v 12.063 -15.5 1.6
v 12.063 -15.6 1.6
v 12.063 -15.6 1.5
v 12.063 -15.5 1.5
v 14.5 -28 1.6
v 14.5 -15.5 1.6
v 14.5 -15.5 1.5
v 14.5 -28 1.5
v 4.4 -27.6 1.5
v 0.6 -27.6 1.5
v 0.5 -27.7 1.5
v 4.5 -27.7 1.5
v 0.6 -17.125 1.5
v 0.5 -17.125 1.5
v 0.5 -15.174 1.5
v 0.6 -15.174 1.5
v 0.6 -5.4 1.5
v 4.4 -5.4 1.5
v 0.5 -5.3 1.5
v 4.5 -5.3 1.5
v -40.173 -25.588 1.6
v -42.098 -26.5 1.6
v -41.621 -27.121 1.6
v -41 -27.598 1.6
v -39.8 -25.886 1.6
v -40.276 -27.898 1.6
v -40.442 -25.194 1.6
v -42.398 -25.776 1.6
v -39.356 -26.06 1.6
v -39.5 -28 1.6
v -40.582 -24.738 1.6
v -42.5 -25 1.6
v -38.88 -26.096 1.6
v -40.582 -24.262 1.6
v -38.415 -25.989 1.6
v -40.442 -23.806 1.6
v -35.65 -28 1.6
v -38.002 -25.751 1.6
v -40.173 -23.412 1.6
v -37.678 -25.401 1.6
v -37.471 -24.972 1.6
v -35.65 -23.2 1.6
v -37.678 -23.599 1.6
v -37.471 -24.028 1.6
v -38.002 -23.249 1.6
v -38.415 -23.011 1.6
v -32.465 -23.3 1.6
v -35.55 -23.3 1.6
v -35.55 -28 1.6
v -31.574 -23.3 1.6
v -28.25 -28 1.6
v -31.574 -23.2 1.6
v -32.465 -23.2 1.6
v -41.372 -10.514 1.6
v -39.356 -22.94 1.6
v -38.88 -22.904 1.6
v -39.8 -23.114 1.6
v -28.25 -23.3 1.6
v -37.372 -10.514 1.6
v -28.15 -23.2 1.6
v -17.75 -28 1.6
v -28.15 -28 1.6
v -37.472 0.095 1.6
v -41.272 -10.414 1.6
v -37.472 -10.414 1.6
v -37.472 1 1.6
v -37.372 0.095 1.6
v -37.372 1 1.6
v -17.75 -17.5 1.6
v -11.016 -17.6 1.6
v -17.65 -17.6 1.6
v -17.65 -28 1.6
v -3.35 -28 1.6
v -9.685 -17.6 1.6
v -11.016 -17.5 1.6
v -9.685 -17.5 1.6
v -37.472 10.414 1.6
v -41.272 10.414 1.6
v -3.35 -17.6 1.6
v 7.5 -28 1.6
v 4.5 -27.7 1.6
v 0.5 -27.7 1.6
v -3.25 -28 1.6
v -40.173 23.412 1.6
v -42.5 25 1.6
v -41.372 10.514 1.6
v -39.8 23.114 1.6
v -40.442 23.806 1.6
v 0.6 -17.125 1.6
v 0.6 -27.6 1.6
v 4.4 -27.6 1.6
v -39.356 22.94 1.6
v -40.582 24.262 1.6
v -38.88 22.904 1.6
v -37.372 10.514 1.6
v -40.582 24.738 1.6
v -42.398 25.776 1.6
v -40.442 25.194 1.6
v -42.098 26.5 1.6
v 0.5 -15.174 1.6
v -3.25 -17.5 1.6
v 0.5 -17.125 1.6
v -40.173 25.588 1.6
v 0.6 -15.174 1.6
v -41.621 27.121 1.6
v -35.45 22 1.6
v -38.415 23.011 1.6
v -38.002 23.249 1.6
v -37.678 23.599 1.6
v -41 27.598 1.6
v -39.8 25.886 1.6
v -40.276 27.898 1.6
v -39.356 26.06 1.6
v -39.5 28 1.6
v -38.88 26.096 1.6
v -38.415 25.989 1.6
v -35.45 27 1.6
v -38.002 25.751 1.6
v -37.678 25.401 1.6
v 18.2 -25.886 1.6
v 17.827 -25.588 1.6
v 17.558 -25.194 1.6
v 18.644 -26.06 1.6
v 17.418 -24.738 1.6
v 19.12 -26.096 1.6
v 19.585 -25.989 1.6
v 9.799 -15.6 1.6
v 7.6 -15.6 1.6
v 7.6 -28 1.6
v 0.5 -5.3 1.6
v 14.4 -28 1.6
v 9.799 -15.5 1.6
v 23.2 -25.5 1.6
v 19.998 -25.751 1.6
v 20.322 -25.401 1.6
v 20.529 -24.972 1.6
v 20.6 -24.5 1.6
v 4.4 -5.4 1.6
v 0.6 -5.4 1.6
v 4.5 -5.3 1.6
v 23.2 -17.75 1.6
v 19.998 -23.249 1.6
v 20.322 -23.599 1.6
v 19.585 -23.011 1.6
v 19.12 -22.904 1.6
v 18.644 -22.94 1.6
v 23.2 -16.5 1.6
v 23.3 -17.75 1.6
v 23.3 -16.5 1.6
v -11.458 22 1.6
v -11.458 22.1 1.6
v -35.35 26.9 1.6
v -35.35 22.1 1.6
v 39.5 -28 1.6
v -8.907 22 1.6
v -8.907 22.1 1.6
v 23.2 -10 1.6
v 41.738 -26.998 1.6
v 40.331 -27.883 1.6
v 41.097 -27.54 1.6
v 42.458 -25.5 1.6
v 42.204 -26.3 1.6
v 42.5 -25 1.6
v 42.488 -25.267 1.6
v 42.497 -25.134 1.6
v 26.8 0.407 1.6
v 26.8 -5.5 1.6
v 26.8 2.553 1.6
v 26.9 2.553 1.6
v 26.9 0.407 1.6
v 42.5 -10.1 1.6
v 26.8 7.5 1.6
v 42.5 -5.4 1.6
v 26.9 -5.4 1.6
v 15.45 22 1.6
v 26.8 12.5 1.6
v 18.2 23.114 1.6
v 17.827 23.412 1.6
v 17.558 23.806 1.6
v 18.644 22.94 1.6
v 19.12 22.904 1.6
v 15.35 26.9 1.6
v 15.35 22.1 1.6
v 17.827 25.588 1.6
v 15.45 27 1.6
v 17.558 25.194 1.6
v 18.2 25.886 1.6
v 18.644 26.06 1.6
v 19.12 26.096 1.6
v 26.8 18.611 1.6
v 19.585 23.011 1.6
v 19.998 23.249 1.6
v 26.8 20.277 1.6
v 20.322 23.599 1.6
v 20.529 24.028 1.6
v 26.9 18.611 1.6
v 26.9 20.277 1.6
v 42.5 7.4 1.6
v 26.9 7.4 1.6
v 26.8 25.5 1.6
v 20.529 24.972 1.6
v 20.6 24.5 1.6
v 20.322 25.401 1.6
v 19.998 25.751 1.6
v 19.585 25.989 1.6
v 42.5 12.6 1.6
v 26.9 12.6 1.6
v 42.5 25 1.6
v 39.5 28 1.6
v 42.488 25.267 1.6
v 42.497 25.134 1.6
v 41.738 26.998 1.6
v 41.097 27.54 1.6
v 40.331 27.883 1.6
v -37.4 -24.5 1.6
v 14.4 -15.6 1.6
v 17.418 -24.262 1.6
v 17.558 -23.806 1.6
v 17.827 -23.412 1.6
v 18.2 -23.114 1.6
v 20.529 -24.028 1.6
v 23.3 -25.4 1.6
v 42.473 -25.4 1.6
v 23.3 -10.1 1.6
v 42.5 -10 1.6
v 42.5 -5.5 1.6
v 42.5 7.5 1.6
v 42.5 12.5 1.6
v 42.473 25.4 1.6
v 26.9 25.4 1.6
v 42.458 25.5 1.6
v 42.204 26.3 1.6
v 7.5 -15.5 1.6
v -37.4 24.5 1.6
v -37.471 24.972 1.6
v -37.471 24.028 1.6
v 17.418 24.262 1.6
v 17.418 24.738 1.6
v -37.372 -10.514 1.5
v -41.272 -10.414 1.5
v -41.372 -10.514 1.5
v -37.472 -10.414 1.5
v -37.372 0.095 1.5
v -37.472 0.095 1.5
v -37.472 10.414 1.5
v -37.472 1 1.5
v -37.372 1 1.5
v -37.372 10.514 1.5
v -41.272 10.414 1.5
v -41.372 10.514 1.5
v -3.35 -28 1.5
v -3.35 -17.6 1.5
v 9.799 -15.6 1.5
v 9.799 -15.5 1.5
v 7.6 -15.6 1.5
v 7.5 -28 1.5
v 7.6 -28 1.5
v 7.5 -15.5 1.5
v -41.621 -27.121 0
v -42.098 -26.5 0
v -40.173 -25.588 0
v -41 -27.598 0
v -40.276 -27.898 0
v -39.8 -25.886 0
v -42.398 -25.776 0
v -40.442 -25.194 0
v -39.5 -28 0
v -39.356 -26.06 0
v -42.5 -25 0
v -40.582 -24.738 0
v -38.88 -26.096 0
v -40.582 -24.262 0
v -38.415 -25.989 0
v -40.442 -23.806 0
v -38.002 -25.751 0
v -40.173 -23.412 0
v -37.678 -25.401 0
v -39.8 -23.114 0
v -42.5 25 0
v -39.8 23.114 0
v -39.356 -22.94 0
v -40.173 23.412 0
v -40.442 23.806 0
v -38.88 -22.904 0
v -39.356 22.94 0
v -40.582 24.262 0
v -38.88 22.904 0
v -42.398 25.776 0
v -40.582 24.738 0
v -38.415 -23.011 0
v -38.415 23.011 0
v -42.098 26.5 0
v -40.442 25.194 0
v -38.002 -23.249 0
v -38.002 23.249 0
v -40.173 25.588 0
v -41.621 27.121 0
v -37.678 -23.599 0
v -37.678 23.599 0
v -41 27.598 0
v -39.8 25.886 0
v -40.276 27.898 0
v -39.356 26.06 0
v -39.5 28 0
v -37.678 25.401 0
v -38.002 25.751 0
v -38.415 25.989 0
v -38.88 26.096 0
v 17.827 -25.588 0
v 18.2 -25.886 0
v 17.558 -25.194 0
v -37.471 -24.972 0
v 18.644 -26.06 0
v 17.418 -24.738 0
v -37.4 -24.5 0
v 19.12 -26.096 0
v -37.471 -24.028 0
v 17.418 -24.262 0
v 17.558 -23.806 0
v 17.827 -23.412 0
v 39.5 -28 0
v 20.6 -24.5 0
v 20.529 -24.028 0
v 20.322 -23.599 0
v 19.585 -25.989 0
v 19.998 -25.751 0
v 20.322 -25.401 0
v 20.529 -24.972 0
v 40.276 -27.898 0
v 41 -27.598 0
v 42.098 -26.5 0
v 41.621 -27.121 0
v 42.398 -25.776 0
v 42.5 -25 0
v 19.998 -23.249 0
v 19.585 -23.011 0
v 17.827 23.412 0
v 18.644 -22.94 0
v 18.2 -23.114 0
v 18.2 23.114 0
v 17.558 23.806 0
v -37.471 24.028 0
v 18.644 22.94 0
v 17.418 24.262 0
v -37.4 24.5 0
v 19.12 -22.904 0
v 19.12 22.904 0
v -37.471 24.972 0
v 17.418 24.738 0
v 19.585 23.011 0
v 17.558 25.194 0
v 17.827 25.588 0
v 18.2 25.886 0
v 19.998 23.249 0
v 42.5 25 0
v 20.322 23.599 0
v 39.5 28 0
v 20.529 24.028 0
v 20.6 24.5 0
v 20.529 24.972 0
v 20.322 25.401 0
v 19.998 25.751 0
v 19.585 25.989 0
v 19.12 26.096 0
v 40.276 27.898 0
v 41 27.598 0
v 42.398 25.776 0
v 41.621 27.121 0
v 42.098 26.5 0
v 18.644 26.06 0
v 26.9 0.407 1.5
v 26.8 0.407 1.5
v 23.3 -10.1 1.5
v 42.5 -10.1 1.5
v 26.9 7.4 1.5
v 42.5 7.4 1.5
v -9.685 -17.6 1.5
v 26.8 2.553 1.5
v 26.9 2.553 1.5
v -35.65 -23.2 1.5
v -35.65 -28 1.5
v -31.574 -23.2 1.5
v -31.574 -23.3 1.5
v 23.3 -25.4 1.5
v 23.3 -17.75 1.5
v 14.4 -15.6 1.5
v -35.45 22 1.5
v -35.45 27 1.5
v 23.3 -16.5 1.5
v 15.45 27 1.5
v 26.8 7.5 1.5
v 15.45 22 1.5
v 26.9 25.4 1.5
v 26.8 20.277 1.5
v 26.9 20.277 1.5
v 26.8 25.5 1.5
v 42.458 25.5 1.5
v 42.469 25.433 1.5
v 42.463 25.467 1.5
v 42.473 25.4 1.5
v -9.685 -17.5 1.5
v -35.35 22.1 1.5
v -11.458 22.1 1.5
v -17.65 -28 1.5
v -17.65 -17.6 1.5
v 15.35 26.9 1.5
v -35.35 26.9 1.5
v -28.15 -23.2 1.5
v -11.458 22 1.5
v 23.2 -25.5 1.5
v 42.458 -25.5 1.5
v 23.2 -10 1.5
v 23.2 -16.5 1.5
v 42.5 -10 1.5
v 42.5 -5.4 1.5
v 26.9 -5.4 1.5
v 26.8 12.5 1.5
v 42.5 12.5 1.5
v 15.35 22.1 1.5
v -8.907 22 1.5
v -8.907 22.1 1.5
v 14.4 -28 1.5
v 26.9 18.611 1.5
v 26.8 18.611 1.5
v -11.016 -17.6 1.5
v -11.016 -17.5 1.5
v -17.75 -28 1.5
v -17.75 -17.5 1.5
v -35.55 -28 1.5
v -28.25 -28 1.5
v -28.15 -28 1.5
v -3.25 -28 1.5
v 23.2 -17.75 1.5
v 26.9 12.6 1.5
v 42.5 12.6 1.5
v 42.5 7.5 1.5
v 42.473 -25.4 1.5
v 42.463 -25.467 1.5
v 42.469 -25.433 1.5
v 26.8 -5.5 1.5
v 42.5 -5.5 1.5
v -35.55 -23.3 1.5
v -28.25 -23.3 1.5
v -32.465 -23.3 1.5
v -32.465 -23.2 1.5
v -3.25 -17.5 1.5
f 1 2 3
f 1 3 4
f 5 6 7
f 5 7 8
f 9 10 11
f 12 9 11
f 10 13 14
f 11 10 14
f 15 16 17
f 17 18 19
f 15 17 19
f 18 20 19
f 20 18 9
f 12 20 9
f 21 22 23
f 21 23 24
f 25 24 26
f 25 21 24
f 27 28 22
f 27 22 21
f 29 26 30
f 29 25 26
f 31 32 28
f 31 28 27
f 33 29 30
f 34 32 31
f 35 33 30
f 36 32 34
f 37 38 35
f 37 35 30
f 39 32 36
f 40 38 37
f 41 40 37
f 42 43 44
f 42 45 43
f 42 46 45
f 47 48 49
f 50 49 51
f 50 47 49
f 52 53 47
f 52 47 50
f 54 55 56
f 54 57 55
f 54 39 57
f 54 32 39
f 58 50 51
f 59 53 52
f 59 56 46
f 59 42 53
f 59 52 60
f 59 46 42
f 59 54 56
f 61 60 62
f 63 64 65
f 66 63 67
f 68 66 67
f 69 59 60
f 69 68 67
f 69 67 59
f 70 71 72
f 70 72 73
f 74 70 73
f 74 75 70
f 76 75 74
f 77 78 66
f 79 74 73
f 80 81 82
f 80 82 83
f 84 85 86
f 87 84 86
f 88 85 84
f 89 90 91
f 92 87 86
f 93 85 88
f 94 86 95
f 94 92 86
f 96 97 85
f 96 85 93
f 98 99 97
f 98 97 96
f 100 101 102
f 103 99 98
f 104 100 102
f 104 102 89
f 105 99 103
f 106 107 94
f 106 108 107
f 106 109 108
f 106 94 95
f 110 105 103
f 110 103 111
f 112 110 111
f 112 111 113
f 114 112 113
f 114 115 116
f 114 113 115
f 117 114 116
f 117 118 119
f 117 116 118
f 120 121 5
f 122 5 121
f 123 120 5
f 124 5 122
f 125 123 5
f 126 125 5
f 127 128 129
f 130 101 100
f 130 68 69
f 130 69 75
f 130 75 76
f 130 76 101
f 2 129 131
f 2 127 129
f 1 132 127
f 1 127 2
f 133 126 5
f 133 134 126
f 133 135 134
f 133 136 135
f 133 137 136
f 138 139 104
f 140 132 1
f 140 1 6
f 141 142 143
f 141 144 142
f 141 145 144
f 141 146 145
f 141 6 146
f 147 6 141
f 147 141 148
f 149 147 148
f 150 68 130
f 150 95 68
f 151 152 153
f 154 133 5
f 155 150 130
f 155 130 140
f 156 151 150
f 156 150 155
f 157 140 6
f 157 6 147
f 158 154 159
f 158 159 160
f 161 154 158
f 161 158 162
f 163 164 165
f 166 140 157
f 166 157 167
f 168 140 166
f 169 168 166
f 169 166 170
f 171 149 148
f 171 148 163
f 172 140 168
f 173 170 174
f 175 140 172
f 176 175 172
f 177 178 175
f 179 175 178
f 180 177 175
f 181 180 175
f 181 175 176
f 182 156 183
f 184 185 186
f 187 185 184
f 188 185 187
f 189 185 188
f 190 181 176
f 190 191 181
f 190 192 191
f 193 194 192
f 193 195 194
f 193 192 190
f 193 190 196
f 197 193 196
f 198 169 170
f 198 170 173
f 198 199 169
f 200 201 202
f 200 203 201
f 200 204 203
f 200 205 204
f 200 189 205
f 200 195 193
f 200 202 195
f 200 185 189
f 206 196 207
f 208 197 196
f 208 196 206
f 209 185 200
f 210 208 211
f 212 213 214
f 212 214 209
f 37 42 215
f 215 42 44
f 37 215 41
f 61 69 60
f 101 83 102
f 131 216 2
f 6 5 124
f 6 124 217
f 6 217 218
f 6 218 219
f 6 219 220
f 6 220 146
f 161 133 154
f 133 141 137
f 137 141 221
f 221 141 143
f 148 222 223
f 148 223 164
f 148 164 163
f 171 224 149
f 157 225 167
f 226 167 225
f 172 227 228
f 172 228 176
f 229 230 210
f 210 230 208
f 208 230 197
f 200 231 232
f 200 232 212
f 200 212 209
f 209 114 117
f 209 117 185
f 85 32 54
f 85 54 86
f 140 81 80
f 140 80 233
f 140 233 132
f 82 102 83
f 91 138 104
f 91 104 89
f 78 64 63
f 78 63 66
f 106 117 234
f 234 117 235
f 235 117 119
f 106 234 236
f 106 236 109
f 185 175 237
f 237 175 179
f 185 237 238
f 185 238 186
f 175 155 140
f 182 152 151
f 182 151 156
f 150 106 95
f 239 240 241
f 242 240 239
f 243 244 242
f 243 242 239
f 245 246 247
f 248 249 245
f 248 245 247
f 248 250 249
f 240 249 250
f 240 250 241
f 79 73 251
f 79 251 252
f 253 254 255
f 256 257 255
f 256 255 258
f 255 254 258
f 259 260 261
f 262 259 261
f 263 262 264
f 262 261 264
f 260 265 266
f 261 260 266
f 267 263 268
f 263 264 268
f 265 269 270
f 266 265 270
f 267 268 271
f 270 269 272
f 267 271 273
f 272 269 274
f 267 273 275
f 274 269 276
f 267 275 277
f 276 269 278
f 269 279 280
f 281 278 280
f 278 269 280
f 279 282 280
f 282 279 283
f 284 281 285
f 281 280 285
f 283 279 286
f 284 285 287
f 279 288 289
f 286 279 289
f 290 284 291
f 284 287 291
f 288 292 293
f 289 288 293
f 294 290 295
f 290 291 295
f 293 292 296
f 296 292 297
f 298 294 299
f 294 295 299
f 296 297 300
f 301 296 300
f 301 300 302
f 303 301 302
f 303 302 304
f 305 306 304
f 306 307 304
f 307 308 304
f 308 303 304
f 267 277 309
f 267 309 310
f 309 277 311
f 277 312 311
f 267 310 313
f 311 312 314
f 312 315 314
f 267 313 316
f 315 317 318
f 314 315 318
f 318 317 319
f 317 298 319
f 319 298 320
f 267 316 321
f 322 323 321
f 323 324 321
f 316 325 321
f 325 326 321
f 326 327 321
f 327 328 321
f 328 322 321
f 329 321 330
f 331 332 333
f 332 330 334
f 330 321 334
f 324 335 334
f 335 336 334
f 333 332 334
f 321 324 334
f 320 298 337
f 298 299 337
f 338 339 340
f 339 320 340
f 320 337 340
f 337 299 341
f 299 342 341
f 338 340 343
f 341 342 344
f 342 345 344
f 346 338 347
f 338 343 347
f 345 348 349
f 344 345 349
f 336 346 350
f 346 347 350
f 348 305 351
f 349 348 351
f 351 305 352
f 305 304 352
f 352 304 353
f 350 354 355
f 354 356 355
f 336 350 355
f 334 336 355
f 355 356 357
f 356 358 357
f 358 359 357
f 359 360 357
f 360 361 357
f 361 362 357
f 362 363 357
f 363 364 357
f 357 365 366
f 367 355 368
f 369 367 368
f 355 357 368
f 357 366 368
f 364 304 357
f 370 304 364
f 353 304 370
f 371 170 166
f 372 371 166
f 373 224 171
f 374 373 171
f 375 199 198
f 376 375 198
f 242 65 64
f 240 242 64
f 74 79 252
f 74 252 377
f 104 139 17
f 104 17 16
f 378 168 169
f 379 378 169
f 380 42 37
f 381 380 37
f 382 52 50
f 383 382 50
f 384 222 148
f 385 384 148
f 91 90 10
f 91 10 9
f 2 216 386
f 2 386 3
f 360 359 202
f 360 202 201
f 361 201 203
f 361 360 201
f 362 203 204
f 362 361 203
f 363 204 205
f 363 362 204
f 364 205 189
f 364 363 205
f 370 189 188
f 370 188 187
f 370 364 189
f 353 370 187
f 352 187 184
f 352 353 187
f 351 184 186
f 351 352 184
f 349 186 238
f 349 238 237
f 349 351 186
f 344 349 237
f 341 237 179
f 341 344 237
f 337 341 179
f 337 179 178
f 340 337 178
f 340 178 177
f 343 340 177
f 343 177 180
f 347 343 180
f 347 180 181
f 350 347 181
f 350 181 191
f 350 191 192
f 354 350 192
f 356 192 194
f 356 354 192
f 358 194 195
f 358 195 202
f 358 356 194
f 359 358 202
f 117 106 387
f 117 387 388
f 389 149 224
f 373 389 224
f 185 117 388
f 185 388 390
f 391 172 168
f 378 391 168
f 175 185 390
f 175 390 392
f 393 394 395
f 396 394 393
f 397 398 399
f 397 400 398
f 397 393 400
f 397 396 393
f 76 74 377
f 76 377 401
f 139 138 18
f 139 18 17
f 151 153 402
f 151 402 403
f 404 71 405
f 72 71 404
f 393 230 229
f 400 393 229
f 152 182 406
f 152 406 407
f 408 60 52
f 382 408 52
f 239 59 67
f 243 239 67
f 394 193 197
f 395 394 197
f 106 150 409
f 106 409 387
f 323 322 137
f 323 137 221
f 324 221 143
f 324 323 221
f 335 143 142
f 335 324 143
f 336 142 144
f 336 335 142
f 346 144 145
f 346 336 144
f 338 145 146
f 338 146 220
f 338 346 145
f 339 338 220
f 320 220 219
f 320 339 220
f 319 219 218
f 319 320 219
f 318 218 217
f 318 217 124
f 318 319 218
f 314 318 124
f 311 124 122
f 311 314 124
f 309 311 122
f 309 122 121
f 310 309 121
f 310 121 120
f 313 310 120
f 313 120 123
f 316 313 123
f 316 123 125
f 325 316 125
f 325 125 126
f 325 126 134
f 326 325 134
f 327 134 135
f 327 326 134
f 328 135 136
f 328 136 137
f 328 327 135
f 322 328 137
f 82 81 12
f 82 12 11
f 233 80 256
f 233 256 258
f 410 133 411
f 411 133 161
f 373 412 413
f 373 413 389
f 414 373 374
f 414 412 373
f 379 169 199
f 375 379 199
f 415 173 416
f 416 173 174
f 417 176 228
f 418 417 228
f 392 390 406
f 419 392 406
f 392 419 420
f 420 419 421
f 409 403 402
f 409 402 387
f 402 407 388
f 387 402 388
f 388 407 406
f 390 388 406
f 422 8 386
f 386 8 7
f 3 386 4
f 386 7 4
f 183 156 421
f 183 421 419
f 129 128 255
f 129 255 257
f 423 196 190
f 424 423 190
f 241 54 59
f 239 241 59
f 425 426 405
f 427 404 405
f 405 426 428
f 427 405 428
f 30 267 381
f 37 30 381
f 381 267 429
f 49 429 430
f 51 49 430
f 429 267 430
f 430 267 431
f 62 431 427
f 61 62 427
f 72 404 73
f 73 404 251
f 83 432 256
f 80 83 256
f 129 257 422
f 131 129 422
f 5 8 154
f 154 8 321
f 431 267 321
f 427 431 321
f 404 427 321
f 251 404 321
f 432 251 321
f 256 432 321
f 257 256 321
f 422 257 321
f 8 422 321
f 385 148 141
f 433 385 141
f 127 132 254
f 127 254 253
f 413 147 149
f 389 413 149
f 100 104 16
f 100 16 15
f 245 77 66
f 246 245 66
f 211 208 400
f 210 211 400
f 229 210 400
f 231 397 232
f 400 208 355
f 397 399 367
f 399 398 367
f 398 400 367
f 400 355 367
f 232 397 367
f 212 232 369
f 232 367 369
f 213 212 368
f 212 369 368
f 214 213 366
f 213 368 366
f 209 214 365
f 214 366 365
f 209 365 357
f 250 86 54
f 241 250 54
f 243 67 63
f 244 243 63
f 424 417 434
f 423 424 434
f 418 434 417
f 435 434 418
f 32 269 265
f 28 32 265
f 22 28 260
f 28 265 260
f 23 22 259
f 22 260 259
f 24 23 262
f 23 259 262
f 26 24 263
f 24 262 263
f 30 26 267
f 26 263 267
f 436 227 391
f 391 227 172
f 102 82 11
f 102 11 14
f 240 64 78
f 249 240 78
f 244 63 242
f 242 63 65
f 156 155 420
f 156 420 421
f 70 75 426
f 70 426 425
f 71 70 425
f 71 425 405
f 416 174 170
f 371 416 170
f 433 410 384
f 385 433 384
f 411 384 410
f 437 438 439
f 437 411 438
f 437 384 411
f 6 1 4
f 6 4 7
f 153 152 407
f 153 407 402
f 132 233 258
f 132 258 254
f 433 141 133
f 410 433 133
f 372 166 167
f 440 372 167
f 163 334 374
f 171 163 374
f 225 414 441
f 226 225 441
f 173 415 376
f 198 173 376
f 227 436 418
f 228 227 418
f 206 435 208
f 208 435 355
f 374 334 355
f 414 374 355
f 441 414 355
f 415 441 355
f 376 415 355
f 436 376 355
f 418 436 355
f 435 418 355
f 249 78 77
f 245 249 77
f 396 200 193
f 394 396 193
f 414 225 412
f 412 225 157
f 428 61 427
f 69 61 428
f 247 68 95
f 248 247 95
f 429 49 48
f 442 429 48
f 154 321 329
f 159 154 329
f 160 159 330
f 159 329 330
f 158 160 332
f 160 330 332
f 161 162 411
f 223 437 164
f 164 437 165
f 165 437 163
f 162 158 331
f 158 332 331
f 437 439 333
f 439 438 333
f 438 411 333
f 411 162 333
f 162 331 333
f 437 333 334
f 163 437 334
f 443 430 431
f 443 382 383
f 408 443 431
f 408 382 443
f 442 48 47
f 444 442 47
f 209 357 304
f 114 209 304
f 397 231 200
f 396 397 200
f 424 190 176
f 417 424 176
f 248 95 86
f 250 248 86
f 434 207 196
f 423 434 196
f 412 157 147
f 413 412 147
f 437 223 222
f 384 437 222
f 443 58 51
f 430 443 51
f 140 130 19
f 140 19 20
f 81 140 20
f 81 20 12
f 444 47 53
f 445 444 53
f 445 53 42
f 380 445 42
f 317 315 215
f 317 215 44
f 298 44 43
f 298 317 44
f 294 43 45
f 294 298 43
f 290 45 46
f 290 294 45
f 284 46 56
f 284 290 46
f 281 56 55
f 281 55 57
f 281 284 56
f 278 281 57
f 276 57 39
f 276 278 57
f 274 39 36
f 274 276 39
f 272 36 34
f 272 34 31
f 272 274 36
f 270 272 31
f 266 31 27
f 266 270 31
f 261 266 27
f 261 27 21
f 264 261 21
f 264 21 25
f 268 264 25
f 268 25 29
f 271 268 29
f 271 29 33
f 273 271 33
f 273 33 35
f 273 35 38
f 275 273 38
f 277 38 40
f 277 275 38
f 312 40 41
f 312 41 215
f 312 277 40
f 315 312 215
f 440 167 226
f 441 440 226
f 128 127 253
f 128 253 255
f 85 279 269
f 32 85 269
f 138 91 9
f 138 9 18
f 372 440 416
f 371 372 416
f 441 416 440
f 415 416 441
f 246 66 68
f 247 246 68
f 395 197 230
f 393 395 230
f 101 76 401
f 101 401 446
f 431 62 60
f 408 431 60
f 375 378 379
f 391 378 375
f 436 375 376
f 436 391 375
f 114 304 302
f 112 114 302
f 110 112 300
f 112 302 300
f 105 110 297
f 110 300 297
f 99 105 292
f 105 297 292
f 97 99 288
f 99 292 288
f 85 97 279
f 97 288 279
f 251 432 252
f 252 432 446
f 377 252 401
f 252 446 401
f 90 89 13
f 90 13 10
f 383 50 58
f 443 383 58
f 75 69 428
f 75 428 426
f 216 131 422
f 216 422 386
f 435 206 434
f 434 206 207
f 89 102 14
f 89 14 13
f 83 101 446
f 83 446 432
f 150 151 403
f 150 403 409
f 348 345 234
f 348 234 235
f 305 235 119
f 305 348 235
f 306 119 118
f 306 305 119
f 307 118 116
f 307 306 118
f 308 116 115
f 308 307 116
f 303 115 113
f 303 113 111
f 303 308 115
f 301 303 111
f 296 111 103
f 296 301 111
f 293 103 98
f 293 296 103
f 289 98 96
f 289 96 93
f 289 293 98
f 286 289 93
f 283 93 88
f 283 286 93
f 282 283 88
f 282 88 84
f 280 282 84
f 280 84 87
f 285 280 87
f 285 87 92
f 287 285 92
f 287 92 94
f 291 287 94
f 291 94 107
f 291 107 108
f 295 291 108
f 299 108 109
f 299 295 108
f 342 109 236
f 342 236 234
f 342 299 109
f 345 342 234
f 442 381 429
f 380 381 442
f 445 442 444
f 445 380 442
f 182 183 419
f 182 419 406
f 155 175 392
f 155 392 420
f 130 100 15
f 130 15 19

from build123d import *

# Parameters (mm, degrees)
SKETCH1_R           = 1.6
BOSS_EXTRUDE1_DEPTH = 1.6
CUT_EXTRUDE1_DEPTH  = 0.1


with BuildPart() as part:
    # Sketch1 → Boss-Extrude1 (new body)
    with BuildSketch(Plane.XY):
        with BuildLine():
            Line((-39.5, -28), (39.5, -28))
            ThreePointArc((39.5, -28), (41.621320344, -27.121320344), (42.5, -25))
            Line((42.5, -25), (42.5, 25))
            ThreePointArc((42.5, 25), (41.621320344, 27.121320344), (39.5, 28))
            Line((39.5, 28), (-39.5, 28))
            ThreePointArc((-39.5, 28), (-41.621320344, 27.121320344), (-42.5, 25))
            Line((-42.5, 25), (-42.5, -25))
            ThreePointArc((-42.5, -25), (-41.621320344, -27.121320344), (-39.5, -28))
        make_face()
        with Locations((-39, 24.5)):
            Circle(SKETCH1_R, mode=Mode.SUBTRACT)
        with Locations((-39, -24.5)):
            Circle(SKETCH1_R, mode=Mode.SUBTRACT)
        with Locations((19, 24.5)):
            Circle(SKETCH1_R, mode=Mode.SUBTRACT)
        with Locations((19, -24.5)):
            Circle(SKETCH1_R, mode=Mode.SUBTRACT)
    extrude(amount=BOSS_EXTRUDE1_DEPTH)

    # Sketch2 → Cut-Extrude1 (cut)
    with BuildSketch(Plane.XY.offset(1.6)):
        Polygon((-35.65, -28.636850855), (-28.15, -28.636850855), (-28.15, -23.2), (-31.573707352, -23.2), (-31.573707352, -23.3), (-28.25, -23.3), (-28.25, -28.536850855), (-35.55, -28.536850855), (-35.55, -23.3), (-32.465045999, -23.3), (-32.465045999, -23.2), (-35.65, -23.2), align=None)
        Polygon((-17.75, -17.5), (-11.015830732, -17.5), (-11.015830732, -17.6), (-17.65, -17.6), (-17.65, -33.061376344), (-3.35, -33.061376344), (-3.35, -17.6), (-9.684859924, -17.6), (-9.684859924, -17.5), (-3.25, -17.5), (-3.25, -33.161376344), (-17.75, -33.161376344), align=None)
        Polygon((0.5, -5.3), (4.5, -5.3), (4.5, -27.7), (0.5, -27.7), (0.5, -17.125), (0.6, -17.125), (0.6, -27.6), (4.4, -27.6), (4.4, -5.4), (0.6, -5.4), (0.6, -15.17398131), (0.5, -15.17398131), align=None)
        Polygon((7.5, -15.5), (9.799158316, -15.5), (9.799158316, -15.6), (7.6, -15.6), (7.6, -31.061376344), (14.4, -31.061376344), (14.4, -15.6), (12.062610562, -15.6), (12.062610562, -15.5), (14.5, -15.5), (14.5, -31.161376344), (7.5, -31.161376344), align=None)
        Polygon((-35.45, 27), (15.45, 27), (15.45, 22), (-8.906687942, 22), (-8.906687942, 22.1), (15.35, 22.1), (15.35, 26.9), (-35.35, 26.9), (-35.35, 22.1), (-11.458179647, 22.1), (-11.458179647, 22), (-35.45, 22), align=None)
        Polygon((-41.371710411, -10.514157593), (-37.371710411, -10.514157593), (-37.371710411, 0.094714316), (-37.471710411, 0.094714316), (-37.471710411, -10.414157593), (-41.271710411, -10.414157593), (-41.271710411, 10.414157593), (-37.471710411, 10.414157593), (-37.471710411, 1), (-37.371710411, 1), (-37.371710411, 10.514157593), (-41.371710411, 10.514157593), align=None)
        Polygon((23.2, -25.5), (44.7, -25.5), (44.7, -10), (23.2, -10), (23.2, -16.5), (23.3, -16.5), (23.3, -10.1), (44.6, -10.1), (44.6, -25.4), (23.3, -25.4), (23.3, -17.75), (23.2, -17.75), align=None)
        Polygon((26.8, -5.5), (54.071370237, -5.5), (54.071370237, 7.5), (26.8, 7.5), (26.8, 2.552788505), (26.9, 2.552788505), (26.9, 7.4), (53.971370237, 7.4), (53.971370237, -5.4), (26.9, -5.4), (26.9, 0.407211154), (26.8, 0.407211154), align=None)
        Polygon((26.8, 12.5), (57.71374017, 12.5), (57.71374017, 25.5), (26.8, 25.5), (26.8, 20.277341759), (26.9, 20.277341759), (26.9, 25.4), (57.61374017, 25.4), (57.61374017, 12.6), (26.9, 12.6), (26.9, 18.611308355), (26.8, 18.611308355), align=None)
    extrude(amount=-CUT_EXTRUDE1_DEPTH, mode=Mode.SUBTRACT)


solid = part.part
